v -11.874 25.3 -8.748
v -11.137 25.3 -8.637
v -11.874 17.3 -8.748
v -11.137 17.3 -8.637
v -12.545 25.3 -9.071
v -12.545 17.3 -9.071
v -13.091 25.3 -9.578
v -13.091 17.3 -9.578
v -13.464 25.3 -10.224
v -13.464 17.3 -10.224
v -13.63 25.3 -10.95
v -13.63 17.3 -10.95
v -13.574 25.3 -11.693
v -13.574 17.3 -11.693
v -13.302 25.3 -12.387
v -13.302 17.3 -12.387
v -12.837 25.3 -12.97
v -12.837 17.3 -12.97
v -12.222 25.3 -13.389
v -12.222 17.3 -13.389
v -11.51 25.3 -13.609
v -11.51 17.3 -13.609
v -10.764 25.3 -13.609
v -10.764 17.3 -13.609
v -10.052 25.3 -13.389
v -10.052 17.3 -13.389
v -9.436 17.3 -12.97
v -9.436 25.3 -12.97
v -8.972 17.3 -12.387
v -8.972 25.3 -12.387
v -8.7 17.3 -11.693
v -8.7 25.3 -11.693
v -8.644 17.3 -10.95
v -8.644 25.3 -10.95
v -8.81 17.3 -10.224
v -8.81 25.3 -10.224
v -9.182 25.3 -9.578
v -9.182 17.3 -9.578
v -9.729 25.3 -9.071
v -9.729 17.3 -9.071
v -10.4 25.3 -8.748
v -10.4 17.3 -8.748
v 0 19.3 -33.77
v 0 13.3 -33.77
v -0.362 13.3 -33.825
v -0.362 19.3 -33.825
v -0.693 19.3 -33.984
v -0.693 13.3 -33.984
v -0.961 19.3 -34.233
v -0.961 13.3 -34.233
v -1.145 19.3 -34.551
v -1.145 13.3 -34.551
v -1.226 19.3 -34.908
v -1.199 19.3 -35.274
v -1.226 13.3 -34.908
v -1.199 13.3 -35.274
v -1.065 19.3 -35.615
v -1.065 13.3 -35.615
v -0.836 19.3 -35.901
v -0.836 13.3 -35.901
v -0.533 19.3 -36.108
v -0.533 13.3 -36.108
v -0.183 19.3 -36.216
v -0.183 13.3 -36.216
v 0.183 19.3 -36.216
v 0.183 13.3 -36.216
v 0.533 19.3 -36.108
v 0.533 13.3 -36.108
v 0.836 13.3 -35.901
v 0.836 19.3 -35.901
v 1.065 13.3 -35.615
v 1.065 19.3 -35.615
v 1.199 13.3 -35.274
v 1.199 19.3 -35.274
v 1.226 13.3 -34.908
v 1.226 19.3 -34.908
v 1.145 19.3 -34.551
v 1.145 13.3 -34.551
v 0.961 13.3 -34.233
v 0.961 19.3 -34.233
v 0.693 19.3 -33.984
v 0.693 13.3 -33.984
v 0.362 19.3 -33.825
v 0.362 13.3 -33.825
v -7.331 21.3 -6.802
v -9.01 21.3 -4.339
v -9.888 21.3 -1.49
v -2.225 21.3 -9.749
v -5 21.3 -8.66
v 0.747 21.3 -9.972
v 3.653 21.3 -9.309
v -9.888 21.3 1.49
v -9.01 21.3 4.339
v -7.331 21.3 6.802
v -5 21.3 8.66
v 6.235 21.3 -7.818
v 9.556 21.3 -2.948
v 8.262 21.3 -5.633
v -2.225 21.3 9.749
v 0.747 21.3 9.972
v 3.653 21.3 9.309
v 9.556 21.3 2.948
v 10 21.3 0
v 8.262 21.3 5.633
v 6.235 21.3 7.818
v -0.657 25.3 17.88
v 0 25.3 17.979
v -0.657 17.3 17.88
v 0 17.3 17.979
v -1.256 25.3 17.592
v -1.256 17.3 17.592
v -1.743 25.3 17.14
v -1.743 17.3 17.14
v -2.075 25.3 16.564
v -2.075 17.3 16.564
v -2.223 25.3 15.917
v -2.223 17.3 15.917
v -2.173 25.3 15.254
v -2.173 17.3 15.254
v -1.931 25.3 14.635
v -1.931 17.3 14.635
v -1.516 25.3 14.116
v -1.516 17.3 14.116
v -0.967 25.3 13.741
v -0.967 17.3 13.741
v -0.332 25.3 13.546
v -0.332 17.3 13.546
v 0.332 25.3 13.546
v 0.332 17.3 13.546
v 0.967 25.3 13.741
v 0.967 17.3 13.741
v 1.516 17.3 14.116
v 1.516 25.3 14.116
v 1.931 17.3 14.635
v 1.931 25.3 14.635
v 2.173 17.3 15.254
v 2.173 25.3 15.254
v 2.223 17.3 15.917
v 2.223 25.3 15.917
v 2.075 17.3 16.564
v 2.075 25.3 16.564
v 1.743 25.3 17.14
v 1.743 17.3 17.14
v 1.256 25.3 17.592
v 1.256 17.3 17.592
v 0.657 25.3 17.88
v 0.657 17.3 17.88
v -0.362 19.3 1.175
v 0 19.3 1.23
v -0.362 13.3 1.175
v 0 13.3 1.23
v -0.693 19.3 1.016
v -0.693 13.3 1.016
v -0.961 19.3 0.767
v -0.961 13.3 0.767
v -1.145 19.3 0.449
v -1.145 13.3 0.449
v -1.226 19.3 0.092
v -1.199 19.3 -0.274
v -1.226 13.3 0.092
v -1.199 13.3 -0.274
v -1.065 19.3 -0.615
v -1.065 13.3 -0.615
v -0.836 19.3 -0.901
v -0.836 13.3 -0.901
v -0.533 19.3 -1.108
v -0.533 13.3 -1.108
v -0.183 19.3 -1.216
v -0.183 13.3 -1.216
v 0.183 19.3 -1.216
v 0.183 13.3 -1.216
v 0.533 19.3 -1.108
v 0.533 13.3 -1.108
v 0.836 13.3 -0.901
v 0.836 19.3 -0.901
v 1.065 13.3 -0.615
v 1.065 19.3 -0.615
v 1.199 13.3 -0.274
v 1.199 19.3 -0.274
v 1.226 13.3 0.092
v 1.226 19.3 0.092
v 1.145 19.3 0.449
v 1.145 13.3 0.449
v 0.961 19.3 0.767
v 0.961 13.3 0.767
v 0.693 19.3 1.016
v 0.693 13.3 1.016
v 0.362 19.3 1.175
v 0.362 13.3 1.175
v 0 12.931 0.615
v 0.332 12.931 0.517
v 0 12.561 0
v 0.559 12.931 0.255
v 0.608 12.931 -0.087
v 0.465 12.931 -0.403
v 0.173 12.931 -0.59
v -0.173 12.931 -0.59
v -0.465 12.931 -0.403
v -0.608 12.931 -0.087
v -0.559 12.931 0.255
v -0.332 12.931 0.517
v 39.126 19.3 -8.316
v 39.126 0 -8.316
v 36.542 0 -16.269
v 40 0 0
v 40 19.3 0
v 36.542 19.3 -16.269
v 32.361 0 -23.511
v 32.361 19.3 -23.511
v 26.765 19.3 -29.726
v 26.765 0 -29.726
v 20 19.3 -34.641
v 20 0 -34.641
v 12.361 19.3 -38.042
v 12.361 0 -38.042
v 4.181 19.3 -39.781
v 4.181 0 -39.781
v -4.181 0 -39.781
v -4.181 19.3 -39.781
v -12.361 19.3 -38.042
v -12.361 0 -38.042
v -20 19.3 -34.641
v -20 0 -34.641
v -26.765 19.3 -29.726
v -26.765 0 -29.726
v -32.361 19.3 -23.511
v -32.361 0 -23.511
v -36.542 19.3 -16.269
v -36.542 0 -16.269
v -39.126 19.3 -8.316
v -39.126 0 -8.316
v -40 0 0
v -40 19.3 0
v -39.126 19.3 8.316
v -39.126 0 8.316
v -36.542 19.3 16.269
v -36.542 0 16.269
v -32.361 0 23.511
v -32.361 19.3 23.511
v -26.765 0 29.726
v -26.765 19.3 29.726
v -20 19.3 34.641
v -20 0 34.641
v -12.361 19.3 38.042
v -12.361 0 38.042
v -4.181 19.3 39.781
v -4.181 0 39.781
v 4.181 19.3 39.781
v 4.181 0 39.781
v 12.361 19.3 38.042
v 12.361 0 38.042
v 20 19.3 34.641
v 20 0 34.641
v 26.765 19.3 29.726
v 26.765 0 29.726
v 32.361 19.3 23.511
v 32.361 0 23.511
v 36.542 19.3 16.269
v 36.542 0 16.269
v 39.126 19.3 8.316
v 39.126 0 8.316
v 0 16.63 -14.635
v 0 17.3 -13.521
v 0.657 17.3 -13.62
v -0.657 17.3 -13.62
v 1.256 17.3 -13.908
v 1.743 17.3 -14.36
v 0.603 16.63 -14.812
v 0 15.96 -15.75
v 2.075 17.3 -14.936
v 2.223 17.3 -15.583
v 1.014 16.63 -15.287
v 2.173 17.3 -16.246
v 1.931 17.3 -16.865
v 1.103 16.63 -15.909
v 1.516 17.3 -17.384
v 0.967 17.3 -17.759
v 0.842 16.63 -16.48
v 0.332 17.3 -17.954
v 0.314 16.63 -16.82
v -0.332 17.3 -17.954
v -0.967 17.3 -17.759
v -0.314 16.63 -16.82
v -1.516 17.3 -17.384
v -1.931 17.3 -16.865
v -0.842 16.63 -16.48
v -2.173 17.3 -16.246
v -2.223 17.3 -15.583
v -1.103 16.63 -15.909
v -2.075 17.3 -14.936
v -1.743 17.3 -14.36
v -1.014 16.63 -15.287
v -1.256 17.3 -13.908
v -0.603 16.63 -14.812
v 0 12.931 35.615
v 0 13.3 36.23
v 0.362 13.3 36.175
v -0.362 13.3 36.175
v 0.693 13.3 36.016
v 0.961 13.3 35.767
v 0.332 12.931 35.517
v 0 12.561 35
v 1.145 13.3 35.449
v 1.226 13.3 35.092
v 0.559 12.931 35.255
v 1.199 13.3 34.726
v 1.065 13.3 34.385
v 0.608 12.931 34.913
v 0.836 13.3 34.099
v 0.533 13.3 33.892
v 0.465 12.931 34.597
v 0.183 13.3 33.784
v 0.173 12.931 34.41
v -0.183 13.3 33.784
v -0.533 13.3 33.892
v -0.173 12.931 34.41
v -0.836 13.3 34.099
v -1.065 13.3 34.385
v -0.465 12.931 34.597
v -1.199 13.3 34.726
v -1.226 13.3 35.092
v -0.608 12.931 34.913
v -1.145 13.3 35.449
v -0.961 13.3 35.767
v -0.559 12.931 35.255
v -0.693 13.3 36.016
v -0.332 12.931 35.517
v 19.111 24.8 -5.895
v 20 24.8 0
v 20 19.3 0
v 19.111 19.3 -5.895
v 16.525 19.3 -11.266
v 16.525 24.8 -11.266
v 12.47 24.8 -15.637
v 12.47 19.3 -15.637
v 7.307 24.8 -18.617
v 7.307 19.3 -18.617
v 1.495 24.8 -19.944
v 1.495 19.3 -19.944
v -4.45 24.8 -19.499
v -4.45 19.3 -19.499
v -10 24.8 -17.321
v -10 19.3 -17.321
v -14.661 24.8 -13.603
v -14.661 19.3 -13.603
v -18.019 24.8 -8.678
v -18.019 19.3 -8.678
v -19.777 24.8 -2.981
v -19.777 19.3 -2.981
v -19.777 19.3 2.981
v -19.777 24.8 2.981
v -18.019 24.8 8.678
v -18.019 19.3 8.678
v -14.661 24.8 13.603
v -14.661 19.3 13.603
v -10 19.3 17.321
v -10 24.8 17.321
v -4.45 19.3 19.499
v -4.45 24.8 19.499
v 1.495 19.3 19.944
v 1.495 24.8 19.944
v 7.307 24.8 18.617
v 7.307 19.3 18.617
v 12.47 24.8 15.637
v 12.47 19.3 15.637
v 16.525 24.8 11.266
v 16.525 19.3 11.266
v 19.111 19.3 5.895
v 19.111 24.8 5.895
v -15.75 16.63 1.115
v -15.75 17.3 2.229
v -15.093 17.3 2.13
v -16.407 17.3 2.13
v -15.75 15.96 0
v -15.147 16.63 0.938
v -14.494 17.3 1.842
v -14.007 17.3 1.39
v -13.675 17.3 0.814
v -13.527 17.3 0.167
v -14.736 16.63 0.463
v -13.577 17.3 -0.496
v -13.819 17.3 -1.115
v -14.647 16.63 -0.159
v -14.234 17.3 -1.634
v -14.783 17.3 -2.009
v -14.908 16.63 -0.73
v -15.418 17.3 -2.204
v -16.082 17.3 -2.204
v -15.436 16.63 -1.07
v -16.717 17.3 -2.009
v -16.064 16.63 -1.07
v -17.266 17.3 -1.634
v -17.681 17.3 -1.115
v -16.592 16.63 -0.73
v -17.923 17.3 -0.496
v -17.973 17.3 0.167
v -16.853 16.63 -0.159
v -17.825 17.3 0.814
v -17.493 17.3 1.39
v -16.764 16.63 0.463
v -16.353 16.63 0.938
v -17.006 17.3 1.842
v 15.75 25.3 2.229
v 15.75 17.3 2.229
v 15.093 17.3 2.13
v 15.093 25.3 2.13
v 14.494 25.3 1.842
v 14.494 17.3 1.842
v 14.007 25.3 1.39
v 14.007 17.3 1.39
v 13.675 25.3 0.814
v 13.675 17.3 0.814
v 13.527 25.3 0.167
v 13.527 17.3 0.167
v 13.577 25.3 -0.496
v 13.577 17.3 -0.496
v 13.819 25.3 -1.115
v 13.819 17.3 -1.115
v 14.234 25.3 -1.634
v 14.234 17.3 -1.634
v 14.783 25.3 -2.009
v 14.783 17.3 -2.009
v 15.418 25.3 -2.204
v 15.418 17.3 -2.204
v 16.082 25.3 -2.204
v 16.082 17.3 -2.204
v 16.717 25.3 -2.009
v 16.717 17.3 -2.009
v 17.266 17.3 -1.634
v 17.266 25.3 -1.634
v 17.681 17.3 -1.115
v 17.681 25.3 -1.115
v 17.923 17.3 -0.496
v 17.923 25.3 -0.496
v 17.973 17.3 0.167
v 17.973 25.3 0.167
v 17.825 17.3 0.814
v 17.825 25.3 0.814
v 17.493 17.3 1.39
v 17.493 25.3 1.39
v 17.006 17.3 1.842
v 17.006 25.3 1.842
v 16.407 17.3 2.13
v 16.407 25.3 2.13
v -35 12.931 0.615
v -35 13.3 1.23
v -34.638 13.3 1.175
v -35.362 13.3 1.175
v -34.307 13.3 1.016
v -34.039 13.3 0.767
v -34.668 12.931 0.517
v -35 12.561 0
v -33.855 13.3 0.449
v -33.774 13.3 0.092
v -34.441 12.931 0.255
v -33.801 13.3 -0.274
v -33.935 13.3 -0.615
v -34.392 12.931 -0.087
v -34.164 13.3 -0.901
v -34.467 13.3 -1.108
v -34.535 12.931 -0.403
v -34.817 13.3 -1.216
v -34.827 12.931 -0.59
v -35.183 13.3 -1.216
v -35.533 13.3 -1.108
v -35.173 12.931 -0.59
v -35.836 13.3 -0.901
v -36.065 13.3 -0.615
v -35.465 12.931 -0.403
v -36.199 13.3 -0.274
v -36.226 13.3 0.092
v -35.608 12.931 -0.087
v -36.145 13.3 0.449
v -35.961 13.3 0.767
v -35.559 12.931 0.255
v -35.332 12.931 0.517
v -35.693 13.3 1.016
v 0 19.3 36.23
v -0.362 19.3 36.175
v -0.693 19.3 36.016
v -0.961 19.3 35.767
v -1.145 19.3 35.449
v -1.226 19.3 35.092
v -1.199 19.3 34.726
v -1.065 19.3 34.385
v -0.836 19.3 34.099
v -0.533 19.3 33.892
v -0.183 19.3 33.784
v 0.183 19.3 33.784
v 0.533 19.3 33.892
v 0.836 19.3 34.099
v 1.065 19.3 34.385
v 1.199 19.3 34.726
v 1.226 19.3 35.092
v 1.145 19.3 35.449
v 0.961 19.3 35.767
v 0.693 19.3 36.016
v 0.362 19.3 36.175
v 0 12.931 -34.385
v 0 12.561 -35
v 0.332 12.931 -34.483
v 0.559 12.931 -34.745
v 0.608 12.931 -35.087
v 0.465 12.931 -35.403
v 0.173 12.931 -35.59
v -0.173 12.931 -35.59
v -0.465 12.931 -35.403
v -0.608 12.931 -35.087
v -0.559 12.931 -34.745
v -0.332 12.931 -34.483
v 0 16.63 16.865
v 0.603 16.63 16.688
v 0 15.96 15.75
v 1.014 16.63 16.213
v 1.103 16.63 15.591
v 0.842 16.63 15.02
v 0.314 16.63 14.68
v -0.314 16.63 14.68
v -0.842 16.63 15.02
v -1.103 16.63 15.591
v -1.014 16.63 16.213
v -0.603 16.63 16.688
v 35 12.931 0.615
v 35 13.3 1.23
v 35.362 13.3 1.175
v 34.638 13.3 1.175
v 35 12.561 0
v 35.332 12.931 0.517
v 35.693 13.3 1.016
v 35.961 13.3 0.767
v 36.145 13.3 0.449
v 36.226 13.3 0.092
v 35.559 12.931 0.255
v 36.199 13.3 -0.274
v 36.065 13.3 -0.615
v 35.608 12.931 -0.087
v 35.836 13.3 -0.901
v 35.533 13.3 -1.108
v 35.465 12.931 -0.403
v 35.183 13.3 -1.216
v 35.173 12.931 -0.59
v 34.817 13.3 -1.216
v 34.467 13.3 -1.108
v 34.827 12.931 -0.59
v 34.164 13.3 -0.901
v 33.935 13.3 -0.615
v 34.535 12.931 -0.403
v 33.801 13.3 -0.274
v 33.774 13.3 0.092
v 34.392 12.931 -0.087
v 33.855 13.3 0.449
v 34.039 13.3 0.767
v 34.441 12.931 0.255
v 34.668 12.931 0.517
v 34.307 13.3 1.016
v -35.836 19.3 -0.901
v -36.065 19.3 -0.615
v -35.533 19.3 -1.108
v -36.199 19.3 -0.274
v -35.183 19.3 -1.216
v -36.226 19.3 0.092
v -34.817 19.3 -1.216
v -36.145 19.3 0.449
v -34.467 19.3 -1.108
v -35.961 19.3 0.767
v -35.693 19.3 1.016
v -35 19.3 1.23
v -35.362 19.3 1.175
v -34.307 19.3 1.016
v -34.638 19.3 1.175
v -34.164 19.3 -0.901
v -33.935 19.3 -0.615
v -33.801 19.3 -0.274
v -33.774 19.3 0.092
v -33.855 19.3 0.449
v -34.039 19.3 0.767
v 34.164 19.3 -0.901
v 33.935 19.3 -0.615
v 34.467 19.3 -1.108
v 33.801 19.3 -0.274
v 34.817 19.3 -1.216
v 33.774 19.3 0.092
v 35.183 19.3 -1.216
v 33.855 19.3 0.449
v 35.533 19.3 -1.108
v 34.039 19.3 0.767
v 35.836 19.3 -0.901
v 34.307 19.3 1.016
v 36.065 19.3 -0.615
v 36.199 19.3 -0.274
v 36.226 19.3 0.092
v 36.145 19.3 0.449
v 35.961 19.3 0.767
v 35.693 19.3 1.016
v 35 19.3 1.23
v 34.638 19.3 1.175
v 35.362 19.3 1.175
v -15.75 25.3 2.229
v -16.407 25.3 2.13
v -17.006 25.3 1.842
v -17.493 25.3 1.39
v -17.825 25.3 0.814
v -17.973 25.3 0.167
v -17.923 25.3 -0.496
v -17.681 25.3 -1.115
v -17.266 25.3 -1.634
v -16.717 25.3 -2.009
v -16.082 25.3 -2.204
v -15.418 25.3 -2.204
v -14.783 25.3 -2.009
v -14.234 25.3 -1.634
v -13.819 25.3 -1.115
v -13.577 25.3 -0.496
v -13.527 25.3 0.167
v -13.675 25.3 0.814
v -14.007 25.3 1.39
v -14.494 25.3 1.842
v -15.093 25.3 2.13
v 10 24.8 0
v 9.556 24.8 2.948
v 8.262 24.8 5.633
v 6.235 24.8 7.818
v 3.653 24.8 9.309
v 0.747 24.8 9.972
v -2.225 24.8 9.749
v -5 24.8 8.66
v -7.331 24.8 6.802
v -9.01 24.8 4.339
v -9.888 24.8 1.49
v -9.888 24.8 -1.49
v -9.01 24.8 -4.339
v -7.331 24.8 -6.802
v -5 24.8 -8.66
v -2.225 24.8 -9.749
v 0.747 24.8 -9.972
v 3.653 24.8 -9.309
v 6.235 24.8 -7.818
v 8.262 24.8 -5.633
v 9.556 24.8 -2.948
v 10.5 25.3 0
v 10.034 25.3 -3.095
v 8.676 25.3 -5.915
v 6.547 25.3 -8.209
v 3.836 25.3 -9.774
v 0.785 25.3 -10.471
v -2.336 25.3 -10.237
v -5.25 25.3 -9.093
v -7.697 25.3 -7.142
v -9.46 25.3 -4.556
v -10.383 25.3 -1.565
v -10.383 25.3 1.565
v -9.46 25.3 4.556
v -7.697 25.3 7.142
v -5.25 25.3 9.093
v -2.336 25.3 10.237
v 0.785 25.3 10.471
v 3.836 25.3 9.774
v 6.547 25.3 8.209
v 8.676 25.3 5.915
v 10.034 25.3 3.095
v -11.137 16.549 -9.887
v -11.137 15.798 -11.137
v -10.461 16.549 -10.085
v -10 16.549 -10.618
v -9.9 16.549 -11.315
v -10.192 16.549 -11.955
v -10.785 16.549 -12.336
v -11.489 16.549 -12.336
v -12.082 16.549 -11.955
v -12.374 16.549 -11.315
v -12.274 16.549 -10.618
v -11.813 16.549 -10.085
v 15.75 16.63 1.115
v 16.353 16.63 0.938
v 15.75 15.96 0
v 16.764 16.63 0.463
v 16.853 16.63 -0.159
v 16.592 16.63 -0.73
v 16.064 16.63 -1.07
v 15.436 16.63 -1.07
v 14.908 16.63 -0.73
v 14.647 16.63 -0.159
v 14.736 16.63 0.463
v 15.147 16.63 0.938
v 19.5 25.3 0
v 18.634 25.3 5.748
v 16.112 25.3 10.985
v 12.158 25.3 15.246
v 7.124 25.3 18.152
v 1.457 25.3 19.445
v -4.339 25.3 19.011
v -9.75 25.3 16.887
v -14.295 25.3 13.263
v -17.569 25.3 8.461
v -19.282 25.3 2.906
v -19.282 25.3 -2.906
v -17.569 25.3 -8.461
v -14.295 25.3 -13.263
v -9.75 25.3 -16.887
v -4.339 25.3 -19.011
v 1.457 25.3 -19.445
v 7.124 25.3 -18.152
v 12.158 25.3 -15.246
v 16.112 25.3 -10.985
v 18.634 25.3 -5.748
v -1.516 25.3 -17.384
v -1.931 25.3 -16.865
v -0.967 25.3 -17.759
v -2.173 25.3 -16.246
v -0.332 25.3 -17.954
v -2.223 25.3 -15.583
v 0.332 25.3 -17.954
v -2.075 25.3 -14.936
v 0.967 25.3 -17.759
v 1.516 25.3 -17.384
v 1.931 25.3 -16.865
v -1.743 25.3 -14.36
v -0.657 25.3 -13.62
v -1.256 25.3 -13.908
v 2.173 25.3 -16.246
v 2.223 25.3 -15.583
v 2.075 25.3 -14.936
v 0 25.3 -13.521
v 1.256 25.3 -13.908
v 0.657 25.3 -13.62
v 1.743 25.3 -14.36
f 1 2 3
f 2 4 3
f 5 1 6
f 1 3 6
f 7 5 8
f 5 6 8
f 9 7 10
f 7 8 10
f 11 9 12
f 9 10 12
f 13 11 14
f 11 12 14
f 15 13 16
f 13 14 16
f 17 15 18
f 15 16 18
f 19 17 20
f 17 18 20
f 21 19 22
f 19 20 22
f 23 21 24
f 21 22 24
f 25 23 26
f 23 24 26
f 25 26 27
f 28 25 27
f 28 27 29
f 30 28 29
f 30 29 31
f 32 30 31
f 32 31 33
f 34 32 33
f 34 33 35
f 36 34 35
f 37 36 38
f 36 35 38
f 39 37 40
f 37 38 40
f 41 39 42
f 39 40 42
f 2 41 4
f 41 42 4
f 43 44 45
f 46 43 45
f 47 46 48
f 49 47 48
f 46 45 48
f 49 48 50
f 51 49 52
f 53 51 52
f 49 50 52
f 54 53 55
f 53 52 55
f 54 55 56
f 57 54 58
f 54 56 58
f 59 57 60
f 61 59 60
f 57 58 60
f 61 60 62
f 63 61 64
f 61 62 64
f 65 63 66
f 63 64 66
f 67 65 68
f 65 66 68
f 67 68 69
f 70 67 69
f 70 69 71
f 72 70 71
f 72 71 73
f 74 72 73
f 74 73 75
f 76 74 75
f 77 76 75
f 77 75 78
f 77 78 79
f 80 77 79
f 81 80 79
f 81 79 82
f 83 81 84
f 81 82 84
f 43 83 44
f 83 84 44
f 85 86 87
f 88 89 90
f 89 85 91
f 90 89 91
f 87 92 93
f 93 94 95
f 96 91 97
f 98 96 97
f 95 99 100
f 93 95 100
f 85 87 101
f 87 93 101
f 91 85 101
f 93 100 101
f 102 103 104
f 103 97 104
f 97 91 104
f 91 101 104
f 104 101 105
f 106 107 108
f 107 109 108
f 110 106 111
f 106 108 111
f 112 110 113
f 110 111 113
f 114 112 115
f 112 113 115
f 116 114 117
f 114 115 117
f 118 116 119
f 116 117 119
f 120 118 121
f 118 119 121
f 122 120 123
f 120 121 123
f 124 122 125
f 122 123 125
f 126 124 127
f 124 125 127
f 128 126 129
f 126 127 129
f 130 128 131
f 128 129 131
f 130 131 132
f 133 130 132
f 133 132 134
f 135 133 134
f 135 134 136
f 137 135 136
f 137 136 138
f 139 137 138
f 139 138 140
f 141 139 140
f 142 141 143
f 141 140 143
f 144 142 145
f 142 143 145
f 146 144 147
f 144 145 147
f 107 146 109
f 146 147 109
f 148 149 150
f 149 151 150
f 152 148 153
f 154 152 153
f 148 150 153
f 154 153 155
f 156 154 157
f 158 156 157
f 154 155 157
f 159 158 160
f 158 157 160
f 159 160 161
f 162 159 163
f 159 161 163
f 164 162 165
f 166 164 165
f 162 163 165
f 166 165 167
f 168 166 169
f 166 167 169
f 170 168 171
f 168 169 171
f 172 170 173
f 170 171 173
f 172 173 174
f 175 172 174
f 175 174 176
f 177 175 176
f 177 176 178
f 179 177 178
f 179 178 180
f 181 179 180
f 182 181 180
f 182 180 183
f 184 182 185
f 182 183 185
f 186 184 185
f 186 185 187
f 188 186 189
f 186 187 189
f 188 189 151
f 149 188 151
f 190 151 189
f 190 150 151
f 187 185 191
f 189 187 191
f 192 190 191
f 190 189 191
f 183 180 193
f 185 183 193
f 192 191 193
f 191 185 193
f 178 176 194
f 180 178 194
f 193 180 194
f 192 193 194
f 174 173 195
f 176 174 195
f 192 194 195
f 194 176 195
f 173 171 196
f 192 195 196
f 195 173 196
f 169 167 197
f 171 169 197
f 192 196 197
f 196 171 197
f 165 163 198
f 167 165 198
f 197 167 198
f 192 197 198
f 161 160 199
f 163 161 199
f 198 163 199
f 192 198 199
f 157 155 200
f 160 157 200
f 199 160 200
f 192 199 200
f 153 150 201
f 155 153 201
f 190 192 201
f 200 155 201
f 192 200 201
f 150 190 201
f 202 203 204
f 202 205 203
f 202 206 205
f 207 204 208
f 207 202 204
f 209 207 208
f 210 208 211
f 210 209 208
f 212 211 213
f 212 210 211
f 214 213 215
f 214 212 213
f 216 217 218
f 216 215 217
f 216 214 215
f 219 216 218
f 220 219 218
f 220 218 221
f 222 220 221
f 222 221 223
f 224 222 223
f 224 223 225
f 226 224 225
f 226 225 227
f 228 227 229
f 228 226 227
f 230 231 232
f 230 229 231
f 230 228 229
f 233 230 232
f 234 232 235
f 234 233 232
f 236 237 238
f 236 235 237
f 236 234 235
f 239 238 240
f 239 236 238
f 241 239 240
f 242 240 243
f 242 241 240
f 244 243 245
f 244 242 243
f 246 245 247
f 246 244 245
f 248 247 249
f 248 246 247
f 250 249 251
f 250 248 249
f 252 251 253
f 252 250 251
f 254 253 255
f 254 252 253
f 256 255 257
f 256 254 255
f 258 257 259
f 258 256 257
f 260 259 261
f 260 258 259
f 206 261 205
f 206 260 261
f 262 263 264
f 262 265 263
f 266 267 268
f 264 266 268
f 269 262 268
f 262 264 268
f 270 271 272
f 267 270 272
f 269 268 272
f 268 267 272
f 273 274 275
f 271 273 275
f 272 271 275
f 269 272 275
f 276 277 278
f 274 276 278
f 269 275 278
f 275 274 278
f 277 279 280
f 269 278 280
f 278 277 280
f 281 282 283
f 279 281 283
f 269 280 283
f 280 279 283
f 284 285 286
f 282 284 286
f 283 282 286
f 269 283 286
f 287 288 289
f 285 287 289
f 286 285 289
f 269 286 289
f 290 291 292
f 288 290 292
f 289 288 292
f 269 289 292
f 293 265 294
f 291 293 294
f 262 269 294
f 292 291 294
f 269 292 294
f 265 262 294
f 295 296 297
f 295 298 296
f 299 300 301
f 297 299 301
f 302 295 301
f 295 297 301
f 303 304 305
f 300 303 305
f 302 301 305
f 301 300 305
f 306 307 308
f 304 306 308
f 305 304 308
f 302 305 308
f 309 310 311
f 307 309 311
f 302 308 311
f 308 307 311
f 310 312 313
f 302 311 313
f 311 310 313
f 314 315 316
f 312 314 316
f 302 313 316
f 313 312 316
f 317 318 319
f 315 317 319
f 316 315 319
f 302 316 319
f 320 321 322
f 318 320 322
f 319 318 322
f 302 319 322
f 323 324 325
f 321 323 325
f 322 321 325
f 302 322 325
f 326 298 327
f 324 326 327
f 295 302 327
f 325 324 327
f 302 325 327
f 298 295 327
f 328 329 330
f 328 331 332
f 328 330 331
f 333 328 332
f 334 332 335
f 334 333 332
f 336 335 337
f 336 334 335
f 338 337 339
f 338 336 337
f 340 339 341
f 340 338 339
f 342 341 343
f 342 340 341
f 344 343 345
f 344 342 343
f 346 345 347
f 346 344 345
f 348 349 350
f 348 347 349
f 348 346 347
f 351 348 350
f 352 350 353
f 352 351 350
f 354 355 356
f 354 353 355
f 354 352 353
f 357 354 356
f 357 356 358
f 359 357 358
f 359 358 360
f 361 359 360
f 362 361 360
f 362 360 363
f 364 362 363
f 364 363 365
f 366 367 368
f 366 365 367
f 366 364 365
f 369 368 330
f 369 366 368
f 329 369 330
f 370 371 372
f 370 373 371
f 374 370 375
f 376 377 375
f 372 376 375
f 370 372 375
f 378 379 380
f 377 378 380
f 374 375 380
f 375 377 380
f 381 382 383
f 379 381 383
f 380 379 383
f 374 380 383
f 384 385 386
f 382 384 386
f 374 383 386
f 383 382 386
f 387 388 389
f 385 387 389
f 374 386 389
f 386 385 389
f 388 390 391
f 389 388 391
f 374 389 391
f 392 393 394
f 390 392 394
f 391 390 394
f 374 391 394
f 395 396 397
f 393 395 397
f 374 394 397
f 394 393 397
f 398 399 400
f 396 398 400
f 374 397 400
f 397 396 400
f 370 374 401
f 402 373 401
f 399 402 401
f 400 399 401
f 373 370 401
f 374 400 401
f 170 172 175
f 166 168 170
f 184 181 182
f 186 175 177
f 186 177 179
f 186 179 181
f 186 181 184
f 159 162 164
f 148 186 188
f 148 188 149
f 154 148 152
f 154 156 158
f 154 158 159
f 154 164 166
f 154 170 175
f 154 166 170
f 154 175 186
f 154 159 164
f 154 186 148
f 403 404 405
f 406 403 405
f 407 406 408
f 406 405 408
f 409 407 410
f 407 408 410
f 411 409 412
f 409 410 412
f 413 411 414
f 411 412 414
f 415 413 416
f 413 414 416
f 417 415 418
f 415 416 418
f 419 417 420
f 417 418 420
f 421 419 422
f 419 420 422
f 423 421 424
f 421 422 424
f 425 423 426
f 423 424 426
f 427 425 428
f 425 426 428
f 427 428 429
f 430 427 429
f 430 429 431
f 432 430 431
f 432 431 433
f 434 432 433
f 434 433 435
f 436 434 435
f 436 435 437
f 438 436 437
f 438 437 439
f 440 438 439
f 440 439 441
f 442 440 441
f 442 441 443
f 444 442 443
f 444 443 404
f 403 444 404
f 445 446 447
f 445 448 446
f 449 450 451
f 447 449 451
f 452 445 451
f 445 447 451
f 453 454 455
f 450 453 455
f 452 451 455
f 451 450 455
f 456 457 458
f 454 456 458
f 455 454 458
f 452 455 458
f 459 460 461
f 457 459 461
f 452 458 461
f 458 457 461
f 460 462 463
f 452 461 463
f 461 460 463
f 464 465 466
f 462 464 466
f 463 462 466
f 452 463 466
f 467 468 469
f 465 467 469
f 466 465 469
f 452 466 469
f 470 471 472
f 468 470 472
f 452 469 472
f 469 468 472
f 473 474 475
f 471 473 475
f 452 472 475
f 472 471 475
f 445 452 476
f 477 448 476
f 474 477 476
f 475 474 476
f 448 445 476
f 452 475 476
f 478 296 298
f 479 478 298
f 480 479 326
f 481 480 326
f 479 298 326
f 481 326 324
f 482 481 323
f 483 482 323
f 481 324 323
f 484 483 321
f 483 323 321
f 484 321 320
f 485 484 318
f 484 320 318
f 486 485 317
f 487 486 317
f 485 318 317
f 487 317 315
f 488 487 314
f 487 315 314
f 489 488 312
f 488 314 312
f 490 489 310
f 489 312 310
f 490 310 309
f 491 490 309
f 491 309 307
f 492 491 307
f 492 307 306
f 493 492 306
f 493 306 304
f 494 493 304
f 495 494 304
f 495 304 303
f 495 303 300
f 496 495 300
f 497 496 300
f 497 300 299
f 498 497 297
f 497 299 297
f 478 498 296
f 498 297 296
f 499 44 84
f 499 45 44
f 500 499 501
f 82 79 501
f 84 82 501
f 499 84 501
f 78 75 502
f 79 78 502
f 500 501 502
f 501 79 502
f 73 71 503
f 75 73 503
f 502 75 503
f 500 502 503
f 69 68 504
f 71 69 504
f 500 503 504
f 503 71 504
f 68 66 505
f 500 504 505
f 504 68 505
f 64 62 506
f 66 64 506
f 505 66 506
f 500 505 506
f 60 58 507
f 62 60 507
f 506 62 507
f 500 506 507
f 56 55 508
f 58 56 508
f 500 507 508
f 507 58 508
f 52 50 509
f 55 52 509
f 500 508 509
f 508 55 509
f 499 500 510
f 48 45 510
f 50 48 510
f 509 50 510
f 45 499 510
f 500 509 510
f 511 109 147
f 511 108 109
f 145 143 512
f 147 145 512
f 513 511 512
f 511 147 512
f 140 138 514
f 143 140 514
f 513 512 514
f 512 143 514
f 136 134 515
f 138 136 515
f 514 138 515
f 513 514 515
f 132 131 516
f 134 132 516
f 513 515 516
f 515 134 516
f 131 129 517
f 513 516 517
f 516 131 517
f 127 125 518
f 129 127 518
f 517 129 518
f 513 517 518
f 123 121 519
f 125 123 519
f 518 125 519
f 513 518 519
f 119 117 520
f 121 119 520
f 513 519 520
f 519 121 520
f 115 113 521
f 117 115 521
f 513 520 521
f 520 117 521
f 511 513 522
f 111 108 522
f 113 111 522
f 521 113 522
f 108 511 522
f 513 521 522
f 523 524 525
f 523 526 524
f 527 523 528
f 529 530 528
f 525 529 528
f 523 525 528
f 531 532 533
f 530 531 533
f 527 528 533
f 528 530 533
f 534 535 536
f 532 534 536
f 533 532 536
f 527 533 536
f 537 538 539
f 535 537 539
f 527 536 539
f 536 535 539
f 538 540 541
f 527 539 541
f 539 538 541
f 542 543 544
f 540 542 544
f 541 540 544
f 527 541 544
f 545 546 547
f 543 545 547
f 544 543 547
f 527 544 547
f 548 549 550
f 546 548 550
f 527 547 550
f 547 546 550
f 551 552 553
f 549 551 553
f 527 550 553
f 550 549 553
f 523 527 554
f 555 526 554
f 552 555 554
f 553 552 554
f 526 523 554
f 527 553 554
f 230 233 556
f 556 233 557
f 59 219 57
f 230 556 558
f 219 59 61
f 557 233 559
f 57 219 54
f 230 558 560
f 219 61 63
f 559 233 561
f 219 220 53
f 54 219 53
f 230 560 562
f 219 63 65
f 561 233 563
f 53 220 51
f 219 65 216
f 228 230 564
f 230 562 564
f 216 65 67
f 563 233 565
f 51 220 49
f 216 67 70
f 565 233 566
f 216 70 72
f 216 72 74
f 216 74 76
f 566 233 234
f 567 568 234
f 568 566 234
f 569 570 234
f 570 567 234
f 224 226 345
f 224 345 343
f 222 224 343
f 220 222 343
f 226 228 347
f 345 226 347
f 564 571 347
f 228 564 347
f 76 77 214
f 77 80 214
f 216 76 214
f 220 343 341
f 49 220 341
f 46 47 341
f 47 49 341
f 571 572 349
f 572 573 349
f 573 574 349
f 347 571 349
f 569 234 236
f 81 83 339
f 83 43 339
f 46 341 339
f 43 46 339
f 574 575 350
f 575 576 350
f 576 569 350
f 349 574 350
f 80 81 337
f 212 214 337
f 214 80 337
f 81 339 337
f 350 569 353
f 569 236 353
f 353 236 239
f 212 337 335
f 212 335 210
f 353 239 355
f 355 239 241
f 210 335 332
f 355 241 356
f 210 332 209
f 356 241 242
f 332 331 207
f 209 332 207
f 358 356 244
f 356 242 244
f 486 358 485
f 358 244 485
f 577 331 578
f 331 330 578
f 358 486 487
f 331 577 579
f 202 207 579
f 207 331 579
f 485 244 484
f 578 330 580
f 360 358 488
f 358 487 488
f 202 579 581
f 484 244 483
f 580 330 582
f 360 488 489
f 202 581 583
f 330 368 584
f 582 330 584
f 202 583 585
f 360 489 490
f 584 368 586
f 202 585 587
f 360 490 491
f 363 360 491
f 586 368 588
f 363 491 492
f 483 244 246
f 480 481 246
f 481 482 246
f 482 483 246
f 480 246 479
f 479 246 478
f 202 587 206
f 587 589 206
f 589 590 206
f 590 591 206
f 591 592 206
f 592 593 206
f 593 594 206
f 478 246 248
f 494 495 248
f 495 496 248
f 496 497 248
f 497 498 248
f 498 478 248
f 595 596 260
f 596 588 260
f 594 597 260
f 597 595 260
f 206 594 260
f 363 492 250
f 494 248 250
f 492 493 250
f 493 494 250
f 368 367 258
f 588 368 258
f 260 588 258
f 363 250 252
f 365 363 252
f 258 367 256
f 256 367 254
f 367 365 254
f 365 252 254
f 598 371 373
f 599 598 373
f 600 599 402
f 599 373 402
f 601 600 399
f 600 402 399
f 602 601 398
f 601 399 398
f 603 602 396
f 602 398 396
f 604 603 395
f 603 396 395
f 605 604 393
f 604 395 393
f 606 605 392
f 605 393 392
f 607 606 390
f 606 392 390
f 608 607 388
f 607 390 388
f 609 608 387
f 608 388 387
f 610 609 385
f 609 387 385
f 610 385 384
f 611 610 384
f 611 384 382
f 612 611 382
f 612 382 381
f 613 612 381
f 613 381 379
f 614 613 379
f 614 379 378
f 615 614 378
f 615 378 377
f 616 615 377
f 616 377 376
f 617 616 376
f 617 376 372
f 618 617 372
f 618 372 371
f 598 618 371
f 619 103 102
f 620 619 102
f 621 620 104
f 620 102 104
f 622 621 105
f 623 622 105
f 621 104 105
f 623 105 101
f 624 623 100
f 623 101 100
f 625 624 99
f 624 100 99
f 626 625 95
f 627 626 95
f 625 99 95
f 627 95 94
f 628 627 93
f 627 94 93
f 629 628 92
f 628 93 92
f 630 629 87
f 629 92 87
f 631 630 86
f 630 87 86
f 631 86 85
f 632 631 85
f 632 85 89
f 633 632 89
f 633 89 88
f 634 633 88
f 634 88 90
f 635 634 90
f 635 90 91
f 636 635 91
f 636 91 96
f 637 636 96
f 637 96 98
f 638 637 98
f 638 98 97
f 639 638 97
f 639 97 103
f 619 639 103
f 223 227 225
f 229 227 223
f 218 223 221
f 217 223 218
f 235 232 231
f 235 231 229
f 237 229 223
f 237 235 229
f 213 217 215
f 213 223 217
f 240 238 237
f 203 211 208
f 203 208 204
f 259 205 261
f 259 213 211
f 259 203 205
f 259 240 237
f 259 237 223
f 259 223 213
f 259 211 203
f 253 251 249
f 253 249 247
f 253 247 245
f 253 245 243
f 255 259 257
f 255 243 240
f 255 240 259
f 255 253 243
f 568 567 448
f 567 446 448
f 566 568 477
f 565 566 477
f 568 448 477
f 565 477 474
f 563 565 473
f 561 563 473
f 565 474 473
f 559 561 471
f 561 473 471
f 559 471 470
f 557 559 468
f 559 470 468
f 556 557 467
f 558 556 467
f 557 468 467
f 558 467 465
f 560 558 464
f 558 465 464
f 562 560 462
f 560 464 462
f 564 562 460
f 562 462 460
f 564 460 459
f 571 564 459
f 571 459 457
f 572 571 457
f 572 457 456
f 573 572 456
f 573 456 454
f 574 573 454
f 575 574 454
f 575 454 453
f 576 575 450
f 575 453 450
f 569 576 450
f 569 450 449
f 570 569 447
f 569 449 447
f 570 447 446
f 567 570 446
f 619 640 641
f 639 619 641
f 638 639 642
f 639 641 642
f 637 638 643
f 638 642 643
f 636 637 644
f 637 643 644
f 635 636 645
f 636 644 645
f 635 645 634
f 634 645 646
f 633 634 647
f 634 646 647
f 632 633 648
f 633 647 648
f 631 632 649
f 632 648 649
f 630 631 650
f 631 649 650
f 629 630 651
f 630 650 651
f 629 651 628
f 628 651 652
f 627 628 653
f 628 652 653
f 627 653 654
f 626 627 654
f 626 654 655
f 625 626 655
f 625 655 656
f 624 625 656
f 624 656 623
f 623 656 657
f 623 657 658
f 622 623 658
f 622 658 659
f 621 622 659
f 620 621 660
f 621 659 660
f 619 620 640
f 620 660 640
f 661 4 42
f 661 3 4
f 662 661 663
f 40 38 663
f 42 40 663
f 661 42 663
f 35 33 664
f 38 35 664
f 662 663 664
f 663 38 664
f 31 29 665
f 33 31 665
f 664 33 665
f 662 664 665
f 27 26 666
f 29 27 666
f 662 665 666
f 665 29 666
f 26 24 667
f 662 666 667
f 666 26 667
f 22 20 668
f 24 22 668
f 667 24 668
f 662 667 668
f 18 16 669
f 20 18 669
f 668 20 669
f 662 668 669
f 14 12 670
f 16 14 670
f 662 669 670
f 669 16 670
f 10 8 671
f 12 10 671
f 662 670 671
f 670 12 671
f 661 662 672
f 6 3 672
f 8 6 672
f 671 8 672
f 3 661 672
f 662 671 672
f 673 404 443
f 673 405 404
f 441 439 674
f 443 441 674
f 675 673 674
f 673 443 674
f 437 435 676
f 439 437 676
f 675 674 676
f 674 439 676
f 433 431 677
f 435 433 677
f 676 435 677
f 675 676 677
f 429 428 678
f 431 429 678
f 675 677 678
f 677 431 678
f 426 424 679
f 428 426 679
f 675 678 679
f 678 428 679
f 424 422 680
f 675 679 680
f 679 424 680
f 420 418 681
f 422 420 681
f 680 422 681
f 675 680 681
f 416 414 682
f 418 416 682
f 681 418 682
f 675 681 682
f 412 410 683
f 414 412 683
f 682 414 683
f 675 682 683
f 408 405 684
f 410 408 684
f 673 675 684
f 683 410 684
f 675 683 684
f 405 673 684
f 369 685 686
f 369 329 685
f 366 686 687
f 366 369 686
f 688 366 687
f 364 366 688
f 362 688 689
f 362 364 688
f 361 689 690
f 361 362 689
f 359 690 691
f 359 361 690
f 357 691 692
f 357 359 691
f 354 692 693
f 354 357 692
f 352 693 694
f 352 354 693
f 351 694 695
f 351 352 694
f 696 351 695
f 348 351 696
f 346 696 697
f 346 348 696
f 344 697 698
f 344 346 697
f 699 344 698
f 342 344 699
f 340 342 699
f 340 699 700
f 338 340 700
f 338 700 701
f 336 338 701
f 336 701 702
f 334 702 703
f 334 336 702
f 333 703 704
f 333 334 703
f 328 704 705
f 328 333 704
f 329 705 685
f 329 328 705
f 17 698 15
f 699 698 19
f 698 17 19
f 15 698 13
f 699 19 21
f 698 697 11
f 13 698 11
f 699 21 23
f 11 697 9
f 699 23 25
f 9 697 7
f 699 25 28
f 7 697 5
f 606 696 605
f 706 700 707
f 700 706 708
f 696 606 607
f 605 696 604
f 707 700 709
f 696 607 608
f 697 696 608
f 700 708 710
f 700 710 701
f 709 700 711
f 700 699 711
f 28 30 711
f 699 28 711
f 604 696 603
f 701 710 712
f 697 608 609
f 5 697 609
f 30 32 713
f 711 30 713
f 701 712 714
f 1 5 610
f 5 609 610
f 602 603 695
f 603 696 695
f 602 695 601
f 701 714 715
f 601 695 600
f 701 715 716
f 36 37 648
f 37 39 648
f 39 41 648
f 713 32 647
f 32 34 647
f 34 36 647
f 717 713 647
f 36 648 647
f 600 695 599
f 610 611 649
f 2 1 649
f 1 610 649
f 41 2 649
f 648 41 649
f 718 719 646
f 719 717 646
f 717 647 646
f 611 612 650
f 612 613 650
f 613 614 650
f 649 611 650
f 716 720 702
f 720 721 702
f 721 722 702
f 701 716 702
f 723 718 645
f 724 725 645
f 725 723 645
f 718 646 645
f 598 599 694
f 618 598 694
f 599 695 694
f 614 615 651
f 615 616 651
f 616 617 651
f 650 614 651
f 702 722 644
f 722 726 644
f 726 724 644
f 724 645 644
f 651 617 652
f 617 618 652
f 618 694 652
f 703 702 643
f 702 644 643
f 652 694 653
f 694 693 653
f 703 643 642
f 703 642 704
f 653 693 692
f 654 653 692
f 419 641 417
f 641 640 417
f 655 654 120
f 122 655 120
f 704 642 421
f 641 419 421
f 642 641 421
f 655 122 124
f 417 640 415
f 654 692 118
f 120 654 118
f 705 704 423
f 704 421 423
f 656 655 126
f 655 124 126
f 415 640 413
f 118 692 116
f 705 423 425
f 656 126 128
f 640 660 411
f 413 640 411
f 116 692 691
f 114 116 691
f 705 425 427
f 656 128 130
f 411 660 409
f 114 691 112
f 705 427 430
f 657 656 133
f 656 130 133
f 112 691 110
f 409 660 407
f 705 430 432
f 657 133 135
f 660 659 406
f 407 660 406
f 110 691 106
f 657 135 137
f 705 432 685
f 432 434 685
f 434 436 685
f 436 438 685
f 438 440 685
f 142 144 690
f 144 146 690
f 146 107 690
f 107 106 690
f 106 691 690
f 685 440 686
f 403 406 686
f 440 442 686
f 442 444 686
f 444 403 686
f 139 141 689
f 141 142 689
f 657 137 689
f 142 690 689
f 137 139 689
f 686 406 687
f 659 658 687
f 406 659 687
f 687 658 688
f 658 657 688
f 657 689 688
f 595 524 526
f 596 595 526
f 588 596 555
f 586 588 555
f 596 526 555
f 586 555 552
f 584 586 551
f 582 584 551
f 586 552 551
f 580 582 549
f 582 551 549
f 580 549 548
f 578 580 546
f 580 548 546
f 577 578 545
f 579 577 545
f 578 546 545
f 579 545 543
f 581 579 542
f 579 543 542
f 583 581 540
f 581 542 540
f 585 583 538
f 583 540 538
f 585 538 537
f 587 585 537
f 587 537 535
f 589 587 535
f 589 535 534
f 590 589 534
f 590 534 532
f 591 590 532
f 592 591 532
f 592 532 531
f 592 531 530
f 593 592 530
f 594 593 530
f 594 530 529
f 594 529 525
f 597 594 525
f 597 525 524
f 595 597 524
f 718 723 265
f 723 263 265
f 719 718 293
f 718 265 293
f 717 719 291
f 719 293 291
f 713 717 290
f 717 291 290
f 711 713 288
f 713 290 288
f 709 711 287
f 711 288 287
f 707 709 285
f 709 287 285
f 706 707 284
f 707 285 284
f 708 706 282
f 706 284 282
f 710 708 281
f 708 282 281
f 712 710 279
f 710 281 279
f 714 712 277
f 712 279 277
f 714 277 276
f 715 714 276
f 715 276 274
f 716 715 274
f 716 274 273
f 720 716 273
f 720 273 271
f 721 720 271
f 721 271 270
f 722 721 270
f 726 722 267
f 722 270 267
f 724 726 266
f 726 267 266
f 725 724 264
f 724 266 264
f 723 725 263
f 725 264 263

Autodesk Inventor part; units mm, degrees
ref_plane "YZ Plane" through (0, 0, 0) normal (1, 0, 0) x (0, 1, 0)
ref_plane "XZ Plane" through (0, 0, 0) normal (0, 1, 0) x (-1, 0, 0)
ref_plane "XY Plane" through (0, 0, 0) normal (0, 0, 1) x (1, 0, 0)
sketch "スケッチ1" plane through (0, 0, 0) normal (0, 0, 1) x (1, 0, 0)
  line L0 (0, 0) -> (40, 0)
  line L1 (40, 0) -> (40, 19.3)
  line L2 (40, 19.3) -> (20, 19.3)
  line L3 (20, 19.3) -> (20, 25.3)
  line L4 (20, 25.3) -> (0, 25.3)
  line L5 (0, 25.3) -> (0, 0)
  line L6 (20, 24.8) -> (19.5, 25.3)
  line L7 (10, 25.3) -> (10, 21.3)
  line L8 (10, 21.3) -> (0, 21.3)
  line L9 (10.5, 25.3) -> (10, 24.8)
  dimension "d0" = 40
  dimension "d1" = 19.3
  dimension "d2" = 20
  dimension "d3" = 6
  dimension "d4" = 135
  dimension "d5" = 0.5
  dimension "d6" = 4
  dimension "d7" = 0.5
  dimension "d8" = 45
revolve "回転1" add sketch "スケッチ1" angle 360 about axis through (0, 25.3, 0) along (0, -1, 0) contours L5 L8 L7 L9 L4 L6 L3 L2 L1 L0
sketch "スケッチ2" plane through (0, 19.3, 0) normal (0, 1, 0) x (1, 0, 0)
  point P0 (0, 0)
  point P1 (0, -35)
  point P2 (0, 0)
  point P3 (35, 0)
  point P4 (0, 35)
  point P5 (-35, 0)
  dimension "d12" = 360
hole "穴1" at (0, 19.3, 35) at (0, 19.3, 0) at (35, 19.3, 0) at (0, 19.3, -35) at (-35, 19.3, 0) direction (0, -1, 0) diameter 2.459 depth 6 tip angle 118 thread size "M3x0.5" class "6H" standard "ISO Metric profile"
sketch "スケッチ3" plane through (0, 25.3, 0) normal (0, 1, 0) x (1, 0, 0)
  point P0 (0, 0)
  point P1 (0, 15.75)
  point P2 (-15.75, 0)
  point P3 (0, -15.75)
  point P4 (15.75, 0)
  dimension "d21" = 15.75
  dimension "d24" = 360
hole "穴2" at (0, 25.3, -15.75) at (-15.75, 25.3, 0) at (0, 25.3, 15.75) at (15.75, 25.3, 0) direction (0, -1, 0) diameter 4.4587 depth 8 tip angle 118 thread size "M5x0.5" class "6H" standard "ISO Metric profile"
sketch "スケッチ4" plane through (0, 25.3, 0) normal (0, 1, 0) x (1, 0, 0)
  circle A0 centre (0, 0) radius 1.2295 projected
  circle A1 centre (0, 0) radius 15.75 construction
  line L0 (-11.1369, 11.1369) -> (0, 0) construction
  line L1 (0, 0) -> (-15.75, 0) construction
  dimension "d33" = 31.5
  dimension "d34" = 45
hole "穴3" at (-11.1369, 25.3, -11.1369) direction (0, -1, 0) diameter 5 depth 8 tip angle 118
properties part number "マニピュレータ手首ISO9409"
